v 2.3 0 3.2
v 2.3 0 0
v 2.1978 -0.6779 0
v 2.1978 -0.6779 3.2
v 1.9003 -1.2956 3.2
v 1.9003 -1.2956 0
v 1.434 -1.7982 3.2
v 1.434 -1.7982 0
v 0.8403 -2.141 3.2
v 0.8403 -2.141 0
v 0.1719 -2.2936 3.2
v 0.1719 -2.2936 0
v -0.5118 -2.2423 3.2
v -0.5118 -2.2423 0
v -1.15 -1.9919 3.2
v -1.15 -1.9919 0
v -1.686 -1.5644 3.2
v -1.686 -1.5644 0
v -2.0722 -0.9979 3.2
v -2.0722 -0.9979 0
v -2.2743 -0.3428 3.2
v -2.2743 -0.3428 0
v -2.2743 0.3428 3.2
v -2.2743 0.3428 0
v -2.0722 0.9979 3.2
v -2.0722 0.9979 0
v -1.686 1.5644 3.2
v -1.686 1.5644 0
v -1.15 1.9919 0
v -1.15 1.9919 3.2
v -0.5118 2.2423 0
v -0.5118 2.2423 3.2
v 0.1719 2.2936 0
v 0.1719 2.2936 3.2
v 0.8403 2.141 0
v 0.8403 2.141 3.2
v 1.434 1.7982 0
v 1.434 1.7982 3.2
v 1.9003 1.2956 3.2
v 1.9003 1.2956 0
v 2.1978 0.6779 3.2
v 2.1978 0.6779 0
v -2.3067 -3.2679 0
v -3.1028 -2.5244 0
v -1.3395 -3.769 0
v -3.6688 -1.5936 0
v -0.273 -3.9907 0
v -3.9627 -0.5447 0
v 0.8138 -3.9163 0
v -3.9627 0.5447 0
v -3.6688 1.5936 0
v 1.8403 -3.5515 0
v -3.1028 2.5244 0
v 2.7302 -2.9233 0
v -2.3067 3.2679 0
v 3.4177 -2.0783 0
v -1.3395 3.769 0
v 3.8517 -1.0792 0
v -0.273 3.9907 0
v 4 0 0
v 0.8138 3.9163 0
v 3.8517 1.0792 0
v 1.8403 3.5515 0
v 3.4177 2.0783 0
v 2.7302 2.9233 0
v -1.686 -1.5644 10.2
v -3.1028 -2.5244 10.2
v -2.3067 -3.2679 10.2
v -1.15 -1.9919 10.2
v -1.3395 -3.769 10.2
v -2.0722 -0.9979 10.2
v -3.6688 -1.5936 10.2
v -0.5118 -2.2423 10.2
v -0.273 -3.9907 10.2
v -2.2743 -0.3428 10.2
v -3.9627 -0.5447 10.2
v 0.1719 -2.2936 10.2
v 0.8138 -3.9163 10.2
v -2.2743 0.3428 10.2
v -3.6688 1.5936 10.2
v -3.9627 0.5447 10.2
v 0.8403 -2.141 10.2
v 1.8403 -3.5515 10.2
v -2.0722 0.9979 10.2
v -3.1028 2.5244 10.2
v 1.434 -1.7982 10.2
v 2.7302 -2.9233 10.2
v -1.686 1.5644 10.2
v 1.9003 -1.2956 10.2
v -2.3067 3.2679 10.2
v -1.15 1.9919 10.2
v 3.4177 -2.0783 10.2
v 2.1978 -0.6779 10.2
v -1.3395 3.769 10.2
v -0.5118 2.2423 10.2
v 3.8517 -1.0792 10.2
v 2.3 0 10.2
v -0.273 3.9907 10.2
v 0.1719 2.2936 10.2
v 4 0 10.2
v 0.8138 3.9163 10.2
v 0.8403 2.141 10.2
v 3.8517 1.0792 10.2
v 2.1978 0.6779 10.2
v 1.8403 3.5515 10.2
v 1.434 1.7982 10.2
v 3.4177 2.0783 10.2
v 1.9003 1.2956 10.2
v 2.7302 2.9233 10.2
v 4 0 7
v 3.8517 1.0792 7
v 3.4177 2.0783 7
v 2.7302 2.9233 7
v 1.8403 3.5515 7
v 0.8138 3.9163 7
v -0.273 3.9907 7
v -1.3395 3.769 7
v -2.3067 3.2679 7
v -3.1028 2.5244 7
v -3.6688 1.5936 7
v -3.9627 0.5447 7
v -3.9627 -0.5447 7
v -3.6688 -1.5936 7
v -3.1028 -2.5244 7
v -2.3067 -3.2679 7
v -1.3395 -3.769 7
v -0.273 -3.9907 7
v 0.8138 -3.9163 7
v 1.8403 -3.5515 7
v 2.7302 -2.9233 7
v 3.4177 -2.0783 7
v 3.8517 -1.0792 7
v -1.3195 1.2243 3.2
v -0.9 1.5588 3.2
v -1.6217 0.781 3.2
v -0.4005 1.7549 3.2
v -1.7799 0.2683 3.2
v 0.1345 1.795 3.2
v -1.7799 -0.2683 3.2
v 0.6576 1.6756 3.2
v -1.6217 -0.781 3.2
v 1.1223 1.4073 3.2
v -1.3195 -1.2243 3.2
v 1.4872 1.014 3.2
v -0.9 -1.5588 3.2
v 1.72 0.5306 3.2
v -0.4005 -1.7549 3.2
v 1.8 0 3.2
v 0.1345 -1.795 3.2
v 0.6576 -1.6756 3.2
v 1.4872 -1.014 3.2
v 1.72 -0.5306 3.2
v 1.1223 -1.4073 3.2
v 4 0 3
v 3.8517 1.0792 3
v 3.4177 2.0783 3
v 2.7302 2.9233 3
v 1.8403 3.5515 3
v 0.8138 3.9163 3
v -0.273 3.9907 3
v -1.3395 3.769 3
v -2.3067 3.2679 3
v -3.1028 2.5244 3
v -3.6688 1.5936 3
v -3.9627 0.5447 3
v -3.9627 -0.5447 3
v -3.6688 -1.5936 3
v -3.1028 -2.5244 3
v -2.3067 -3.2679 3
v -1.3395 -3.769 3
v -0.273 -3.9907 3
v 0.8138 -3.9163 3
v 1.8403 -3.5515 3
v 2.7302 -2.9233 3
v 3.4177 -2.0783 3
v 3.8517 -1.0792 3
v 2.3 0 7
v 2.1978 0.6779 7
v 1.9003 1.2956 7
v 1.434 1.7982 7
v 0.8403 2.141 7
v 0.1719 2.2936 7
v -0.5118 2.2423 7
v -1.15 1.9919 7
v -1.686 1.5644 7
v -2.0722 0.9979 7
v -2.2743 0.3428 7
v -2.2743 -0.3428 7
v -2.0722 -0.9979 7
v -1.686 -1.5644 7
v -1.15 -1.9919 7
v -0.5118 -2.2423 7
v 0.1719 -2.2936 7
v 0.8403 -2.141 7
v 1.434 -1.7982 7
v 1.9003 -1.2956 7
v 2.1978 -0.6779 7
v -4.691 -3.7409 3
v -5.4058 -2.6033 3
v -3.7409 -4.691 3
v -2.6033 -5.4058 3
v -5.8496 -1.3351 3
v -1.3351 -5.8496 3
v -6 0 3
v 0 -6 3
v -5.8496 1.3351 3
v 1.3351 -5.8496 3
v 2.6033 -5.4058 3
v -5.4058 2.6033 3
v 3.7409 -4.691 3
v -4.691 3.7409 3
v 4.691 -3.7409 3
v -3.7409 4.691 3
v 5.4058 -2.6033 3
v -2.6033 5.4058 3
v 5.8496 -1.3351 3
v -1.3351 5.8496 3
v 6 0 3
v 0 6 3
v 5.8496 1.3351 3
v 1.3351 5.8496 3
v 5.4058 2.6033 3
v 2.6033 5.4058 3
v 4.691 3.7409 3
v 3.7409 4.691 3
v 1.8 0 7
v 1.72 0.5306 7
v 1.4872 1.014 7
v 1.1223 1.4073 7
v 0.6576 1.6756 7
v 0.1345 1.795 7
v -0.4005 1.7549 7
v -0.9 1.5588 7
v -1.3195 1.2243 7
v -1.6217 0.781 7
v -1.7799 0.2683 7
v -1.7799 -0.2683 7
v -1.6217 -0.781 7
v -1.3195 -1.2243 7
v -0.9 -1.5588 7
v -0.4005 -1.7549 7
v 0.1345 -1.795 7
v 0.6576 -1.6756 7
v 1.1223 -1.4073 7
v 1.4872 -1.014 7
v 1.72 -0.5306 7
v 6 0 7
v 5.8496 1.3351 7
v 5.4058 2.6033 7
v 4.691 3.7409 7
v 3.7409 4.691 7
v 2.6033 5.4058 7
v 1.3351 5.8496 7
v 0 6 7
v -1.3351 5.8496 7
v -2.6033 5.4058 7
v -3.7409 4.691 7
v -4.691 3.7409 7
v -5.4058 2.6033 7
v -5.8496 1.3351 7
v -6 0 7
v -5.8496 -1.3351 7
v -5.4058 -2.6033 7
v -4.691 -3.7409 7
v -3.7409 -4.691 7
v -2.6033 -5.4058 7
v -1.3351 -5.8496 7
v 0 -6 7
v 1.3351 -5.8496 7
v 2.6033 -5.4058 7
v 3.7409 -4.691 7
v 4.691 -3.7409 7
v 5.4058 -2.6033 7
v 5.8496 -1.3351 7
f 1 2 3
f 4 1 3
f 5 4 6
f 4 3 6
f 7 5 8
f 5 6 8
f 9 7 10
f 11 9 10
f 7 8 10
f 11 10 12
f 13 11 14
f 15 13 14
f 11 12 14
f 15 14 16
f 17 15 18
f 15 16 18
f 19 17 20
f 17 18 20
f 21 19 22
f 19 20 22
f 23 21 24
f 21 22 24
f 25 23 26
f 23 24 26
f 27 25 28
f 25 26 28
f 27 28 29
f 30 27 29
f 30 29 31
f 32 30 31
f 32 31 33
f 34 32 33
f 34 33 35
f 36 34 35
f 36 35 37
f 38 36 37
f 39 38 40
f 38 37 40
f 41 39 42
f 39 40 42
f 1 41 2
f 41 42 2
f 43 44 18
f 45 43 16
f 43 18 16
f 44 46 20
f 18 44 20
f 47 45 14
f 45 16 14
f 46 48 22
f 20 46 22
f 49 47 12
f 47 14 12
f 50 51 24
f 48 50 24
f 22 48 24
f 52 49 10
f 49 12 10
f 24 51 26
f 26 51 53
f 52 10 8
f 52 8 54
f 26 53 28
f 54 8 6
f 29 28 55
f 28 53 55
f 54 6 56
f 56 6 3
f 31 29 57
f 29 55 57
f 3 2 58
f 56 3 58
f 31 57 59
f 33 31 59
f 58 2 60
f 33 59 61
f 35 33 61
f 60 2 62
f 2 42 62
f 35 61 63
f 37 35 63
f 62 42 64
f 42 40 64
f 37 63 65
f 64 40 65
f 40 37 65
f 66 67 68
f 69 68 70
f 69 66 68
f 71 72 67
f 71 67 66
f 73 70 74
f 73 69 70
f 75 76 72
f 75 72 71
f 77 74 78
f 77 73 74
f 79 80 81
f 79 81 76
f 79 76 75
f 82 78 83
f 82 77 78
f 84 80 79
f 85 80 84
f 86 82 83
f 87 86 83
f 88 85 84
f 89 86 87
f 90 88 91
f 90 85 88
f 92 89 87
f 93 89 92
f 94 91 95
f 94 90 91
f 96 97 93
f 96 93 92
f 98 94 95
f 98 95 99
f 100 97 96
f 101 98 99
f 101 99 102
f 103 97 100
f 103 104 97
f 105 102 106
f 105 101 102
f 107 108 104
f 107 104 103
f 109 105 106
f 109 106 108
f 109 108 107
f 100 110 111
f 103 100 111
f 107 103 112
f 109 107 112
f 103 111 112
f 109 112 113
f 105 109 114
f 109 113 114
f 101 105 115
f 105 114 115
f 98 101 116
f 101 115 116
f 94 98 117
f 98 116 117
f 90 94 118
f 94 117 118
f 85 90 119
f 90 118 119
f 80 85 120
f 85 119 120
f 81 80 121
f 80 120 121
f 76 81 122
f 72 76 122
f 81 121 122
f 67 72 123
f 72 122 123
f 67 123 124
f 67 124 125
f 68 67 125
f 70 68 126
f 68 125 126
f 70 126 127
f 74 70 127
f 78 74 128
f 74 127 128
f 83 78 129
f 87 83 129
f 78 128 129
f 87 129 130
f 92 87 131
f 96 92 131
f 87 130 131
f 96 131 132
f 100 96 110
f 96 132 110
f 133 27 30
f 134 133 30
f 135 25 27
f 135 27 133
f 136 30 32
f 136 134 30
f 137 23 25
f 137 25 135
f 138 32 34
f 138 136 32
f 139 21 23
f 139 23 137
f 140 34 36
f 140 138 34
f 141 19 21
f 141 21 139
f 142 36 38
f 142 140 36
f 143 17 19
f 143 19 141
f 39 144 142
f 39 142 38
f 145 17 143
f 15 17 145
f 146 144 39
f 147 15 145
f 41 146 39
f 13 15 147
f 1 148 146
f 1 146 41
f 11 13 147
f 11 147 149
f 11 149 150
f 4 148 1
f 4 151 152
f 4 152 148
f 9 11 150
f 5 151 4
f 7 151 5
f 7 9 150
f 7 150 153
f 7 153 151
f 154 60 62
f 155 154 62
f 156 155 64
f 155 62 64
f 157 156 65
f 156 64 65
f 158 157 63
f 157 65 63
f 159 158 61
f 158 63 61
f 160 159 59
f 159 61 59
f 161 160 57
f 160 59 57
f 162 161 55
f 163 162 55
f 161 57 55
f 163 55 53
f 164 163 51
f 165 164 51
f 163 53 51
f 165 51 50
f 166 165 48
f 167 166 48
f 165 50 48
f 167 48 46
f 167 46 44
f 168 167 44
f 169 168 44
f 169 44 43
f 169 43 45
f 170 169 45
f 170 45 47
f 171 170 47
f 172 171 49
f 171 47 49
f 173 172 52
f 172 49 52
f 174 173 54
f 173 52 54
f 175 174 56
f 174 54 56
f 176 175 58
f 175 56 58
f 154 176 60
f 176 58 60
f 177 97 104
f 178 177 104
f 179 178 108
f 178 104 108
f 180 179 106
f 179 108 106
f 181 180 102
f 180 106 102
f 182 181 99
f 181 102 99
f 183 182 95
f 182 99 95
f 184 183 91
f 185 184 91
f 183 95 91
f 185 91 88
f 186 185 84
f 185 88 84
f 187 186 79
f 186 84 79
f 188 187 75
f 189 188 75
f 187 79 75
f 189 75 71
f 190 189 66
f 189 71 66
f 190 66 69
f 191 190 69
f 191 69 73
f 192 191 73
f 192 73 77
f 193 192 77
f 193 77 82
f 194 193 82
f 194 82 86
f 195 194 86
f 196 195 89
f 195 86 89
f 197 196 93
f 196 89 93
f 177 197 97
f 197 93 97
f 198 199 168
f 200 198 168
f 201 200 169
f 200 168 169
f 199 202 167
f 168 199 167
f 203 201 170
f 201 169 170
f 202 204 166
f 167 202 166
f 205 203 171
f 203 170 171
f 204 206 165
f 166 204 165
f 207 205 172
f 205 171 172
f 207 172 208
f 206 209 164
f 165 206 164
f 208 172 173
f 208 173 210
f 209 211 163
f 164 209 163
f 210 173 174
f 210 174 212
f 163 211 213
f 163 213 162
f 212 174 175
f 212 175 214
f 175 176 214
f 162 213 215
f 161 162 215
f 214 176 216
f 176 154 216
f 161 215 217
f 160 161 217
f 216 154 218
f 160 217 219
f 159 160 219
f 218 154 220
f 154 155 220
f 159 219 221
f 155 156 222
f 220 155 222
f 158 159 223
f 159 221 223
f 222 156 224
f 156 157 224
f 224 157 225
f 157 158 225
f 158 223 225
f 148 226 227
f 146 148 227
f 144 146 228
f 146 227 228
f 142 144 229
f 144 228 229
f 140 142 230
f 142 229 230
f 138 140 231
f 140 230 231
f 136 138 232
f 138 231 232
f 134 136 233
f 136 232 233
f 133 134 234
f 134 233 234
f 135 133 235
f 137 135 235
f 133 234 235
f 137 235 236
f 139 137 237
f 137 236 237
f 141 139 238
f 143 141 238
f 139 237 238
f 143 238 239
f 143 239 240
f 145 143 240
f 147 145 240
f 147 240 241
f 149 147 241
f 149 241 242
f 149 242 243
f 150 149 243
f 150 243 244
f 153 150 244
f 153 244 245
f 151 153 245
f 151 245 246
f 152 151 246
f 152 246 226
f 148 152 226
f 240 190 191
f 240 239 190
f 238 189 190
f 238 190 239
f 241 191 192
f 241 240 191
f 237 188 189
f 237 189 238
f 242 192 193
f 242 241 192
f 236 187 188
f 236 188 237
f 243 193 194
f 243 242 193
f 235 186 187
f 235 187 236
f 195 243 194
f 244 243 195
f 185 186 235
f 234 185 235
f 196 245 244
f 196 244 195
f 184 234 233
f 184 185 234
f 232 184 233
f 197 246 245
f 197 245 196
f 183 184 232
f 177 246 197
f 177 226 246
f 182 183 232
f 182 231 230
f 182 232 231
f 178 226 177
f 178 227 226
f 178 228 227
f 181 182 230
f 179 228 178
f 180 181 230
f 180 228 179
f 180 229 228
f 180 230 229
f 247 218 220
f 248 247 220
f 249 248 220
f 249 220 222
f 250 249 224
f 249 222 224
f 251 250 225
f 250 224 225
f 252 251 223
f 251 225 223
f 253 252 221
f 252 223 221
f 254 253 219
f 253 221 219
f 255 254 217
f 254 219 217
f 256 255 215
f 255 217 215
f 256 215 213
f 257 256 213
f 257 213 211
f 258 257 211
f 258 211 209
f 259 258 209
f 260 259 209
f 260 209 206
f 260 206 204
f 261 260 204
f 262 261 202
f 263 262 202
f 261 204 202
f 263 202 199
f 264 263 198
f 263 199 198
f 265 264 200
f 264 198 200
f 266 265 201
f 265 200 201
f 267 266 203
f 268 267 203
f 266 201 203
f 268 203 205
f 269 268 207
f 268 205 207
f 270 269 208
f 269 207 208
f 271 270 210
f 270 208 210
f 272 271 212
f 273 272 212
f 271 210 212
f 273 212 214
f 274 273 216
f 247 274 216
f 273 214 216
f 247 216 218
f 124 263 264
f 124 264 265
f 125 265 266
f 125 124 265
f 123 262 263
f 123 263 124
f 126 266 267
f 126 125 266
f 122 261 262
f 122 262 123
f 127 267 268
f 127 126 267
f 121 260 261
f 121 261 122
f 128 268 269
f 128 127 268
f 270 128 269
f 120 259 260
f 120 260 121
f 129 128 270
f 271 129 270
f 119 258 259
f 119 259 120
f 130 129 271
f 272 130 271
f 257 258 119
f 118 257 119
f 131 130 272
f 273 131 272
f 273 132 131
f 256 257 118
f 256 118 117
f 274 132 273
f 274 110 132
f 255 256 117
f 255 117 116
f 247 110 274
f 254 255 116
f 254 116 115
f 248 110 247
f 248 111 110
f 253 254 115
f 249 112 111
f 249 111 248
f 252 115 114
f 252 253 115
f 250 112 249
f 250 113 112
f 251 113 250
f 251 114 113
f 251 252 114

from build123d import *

# Parameters (mm, degrees)
F0_R      = 4
F1_DEPTH  = 3
F2_R      = 6
F3_DEPTH  = 4
F4_R      = 4
F5_DEPTH  = 3.2
F6_R      = 1.8
F7_DEPTH  = 10.201
F8_R      = 2.3
F9_DEPTH  = 3.2
F10_R     = 2.3
F11_DEPTH = 3.2


with BuildPart() as f1:
    # F0 (on Top) → F1 (new body)
    with BuildSketch(Plane.XY):
        Circle(F0_R)
    extrude(amount=F1_DEPTH)

    # F2 (on face) → F3 (join)
    with BuildSketch(Plane.XY.offset(3)):
        Circle(F2_R)
    extrude(amount=F3_DEPTH)

    # F4 (on face) → F5 (join)
    with BuildSketch(Plane.XY.offset(7)):
        Circle(F4_R)
    extrude(amount=F5_DEPTH)

    # F6 (on face) → F7 (cut, through all)
    with BuildSketch(Plane.XY.offset(10.2)):
        Circle(F6_R)
    extrude(amount=-F7_DEPTH, mode=Mode.SUBTRACT)

    # F8 (on face) → F9 (cut)
    with BuildSketch(Plane(origin=(0, 0, 0), x_dir=(1, 0, 0), z_dir=(0, 0, -1))):
        Circle(F8_R)
    extrude(amount=-F9_DEPTH, mode=Mode.SUBTRACT)

    # F10 (on face) → F11 (cut)
    with BuildSketch(Plane.XY.offset(10.2)):
        Circle(F10_R)
    extrude(amount=-F11_DEPTH, mode=Mode.SUBTRACT)


solid = f1.part
